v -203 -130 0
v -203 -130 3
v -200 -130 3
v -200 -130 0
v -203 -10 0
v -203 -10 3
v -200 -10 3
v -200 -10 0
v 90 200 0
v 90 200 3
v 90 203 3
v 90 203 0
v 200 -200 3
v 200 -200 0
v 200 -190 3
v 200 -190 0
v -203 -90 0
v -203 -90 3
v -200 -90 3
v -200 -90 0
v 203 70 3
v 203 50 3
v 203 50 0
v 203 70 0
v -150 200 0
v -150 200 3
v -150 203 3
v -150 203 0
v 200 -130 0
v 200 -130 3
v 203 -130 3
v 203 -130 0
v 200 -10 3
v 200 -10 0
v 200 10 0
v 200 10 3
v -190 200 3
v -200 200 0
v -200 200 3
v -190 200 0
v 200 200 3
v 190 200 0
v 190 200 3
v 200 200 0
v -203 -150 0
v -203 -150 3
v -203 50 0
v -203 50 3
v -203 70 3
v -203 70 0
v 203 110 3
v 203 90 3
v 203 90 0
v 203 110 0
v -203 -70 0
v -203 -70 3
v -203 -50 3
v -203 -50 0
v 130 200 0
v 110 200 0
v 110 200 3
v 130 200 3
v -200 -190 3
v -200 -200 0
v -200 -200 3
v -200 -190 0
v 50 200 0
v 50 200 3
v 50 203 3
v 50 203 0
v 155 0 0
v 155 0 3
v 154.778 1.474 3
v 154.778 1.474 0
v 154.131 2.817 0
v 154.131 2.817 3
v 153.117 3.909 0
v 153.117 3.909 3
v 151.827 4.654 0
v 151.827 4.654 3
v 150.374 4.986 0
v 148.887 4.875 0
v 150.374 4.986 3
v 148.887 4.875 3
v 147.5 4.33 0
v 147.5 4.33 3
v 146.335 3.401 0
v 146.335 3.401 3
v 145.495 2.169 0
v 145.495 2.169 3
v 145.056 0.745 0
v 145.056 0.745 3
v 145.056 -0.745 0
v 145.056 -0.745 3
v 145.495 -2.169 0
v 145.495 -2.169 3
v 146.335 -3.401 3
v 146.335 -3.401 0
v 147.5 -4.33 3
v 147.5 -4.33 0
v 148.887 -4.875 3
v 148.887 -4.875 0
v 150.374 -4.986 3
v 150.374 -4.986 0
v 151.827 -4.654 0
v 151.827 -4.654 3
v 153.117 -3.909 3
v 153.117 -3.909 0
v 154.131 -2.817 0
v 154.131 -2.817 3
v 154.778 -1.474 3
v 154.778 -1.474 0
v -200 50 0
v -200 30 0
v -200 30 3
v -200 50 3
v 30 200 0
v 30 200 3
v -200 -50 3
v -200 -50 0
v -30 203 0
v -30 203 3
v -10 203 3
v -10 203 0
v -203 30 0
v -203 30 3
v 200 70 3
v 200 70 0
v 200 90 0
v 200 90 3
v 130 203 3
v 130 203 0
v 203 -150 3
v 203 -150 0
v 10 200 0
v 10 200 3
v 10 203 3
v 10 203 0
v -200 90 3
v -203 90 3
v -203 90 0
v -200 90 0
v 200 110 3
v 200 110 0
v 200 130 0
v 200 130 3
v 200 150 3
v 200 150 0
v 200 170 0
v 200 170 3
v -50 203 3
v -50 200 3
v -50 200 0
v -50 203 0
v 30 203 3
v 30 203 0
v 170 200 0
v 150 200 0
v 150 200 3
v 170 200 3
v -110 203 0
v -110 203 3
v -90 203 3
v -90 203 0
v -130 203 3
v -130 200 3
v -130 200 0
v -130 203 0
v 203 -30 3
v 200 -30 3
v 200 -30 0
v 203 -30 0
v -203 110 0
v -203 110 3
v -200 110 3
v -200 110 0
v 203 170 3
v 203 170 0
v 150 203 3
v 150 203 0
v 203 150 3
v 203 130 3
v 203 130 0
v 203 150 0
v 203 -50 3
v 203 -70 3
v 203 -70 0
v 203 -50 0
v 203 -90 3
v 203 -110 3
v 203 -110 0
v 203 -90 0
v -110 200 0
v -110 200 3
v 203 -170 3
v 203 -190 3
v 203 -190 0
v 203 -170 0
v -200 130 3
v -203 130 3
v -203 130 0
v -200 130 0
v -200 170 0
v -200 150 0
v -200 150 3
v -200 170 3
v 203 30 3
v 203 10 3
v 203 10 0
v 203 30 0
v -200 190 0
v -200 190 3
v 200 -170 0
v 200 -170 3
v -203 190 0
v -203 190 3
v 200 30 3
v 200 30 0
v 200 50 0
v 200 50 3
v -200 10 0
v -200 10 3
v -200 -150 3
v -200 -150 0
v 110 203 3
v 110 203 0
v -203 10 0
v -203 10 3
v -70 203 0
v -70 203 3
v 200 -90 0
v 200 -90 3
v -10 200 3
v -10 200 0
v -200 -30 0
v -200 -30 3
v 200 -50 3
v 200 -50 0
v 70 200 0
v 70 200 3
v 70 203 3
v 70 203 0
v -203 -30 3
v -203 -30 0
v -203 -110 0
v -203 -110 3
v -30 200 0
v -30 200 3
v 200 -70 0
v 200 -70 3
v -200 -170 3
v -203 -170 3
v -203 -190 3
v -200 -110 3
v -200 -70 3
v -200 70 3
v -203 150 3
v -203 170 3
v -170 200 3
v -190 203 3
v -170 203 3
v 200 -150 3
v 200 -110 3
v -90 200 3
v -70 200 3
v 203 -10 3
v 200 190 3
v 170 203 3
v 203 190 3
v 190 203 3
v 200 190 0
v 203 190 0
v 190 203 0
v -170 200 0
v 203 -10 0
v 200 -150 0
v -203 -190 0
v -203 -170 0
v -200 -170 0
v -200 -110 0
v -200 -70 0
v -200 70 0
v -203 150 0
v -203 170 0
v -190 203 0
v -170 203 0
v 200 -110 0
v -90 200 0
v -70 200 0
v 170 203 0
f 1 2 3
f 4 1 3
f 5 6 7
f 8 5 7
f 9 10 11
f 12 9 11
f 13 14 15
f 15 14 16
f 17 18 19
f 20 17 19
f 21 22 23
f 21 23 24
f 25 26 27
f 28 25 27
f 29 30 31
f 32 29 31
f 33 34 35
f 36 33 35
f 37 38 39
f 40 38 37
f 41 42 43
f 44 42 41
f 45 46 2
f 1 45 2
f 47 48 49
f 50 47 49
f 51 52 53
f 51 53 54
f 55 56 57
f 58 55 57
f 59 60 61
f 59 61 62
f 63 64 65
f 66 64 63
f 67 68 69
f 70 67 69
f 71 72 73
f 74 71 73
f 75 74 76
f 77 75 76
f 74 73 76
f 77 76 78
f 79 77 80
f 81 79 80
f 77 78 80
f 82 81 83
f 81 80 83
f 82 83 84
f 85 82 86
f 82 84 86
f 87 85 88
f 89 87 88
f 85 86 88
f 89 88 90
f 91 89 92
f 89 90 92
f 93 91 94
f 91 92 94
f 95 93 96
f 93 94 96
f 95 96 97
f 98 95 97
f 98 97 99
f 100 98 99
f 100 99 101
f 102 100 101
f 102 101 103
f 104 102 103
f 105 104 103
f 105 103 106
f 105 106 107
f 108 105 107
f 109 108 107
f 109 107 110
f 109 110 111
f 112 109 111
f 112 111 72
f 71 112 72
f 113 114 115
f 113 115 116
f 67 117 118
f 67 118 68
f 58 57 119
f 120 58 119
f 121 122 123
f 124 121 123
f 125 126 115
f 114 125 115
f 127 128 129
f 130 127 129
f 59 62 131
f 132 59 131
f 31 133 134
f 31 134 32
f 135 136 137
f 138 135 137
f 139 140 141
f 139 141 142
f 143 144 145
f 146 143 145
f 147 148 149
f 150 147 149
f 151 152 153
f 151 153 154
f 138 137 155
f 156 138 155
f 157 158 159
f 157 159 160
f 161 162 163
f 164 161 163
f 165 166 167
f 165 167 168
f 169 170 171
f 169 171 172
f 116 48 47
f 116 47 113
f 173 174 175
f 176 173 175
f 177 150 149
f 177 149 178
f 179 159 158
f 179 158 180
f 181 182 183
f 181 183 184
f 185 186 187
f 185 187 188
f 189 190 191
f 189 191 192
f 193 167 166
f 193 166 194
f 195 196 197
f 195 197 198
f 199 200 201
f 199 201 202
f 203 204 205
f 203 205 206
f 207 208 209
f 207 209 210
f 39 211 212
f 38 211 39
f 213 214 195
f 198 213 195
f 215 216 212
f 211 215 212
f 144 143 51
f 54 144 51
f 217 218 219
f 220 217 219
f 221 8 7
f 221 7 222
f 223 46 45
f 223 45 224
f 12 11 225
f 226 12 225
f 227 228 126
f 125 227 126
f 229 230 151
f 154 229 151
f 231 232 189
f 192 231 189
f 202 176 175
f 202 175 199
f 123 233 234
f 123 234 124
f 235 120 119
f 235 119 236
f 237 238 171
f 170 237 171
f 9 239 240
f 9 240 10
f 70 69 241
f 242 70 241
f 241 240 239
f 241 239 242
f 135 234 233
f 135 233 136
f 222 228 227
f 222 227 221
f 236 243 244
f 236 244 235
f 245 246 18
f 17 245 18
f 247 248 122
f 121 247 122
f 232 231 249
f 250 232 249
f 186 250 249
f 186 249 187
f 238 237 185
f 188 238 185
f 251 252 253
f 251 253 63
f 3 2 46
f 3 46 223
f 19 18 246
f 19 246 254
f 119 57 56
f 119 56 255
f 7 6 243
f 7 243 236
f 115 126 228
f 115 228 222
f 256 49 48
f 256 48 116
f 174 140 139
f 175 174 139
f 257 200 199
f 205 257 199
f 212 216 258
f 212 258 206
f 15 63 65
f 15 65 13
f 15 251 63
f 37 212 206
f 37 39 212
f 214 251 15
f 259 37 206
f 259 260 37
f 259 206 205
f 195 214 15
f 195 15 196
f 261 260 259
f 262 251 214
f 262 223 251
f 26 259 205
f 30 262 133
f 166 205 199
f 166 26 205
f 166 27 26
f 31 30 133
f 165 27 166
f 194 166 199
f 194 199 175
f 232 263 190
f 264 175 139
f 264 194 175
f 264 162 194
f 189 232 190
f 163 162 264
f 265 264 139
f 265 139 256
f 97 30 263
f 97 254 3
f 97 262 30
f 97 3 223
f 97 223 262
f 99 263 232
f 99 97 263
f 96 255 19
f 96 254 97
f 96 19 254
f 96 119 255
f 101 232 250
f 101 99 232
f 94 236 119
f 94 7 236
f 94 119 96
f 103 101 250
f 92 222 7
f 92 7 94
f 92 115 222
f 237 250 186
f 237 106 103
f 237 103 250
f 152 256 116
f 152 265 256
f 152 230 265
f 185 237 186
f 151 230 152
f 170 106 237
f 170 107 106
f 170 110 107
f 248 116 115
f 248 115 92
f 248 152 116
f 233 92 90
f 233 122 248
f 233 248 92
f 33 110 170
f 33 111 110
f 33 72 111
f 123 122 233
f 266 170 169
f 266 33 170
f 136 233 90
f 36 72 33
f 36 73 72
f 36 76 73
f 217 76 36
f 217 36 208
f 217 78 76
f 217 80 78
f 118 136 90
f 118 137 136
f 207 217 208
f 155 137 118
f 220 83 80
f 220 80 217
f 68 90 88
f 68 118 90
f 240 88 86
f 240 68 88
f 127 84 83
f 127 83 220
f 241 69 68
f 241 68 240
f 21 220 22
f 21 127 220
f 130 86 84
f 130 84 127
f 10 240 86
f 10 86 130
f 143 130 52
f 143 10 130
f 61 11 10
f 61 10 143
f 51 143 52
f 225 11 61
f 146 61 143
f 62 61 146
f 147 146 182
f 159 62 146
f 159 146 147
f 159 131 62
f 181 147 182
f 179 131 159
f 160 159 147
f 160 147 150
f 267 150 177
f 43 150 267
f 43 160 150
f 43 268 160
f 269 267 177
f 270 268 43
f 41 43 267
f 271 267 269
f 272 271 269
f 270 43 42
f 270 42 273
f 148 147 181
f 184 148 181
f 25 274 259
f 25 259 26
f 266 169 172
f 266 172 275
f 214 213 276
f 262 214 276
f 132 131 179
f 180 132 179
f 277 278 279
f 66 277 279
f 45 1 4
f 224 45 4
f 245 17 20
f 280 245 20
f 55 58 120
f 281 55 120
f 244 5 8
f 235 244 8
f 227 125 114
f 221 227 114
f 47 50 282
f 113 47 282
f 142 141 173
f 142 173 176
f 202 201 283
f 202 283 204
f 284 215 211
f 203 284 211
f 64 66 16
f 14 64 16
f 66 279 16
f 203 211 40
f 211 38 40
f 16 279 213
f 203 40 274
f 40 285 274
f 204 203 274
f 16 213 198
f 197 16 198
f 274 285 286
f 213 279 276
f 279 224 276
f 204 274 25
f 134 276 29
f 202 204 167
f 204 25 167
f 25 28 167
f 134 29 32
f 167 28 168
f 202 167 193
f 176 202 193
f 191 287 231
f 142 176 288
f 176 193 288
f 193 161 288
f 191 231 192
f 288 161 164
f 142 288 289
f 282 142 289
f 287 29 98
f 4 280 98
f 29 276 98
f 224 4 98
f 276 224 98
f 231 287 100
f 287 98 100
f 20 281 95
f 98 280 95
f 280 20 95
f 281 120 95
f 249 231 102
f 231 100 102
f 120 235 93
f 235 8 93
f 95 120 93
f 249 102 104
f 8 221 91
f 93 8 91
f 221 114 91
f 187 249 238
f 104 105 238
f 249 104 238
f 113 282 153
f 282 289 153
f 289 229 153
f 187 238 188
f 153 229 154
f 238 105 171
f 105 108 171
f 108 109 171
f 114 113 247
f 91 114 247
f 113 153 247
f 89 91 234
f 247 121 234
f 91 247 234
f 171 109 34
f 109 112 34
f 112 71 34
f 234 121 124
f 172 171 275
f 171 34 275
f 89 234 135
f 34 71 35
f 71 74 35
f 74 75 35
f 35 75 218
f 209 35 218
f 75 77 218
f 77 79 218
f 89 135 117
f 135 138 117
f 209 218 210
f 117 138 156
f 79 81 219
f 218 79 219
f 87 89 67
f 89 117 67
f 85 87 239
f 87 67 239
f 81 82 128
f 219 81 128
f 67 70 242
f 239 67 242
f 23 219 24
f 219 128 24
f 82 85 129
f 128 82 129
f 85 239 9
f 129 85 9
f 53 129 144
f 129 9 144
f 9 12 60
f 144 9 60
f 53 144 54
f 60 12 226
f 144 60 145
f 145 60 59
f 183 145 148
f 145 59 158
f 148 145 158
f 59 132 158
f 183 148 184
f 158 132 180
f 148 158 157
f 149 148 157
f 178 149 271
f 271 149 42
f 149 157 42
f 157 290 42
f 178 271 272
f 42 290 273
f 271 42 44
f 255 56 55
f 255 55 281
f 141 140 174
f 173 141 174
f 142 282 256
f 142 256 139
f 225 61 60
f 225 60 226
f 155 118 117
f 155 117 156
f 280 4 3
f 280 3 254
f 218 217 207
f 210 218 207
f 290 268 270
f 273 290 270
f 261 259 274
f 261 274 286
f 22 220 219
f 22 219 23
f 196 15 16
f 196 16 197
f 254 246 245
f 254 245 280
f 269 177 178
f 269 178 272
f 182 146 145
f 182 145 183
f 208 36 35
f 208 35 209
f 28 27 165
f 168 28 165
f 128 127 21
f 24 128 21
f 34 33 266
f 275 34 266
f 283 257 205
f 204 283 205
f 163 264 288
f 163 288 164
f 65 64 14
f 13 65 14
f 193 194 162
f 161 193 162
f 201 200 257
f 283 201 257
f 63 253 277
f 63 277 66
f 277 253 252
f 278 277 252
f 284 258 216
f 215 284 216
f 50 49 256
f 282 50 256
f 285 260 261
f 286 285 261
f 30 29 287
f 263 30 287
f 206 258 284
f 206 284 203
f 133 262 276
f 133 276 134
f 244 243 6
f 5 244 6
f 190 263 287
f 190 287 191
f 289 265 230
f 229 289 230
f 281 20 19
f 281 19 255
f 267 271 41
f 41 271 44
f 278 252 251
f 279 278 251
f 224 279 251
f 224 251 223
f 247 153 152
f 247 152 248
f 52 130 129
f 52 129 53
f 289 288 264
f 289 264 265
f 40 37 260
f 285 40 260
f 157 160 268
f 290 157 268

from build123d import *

# Parameters (mm, degrees)
F0_W     = 400
F0_H     = 400
F1_DEPTH = 3
F2_W     = 20
F2_H     = 3
F2_W_2   = 3
F2_H_2   = 20
F3_DEPTH = 3
F4_R     = 5
F5_DEPTH = 25
F6_W     = 380
F6_H     = 3
F7_DEPTH = 25


with BuildPart() as f1:
    # F0 (on Top) → F1 (new body)
    with BuildSketch(Plane.XY):
        Rectangle(F0_W, F0_H)
    extrude(amount=F1_DEPTH)

    # F2 (on face) → F3 (join, through all)
    with BuildSketch(Plane.XY.offset(3)):
        with Locations((-180, -201.5)):
            Rectangle(F2_W, F2_H)
        with Locations((-140, -201.5)):
            Rectangle(F2_W, F2_H)
        with Locations((-100, -201.5)):
            Rectangle(F2_W, F2_H)
        with Locations((-60, -201.5)):
            Rectangle(F2_W, F2_H)
        with Locations((-20, -201.5)):
            Rectangle(F2_W, F2_H)
        with Locations((20, -201.5)):
            Rectangle(F2_W, F2_H)
        with Locations((60, -201.5)):
            Rectangle(F2_W, F2_H)
        with Locations((100, -201.5)):
            Rectangle(F2_W, F2_H)
        with Locations((140, -201.5)):
            Rectangle(F2_W, F2_H)
        with Locations((180, -201.5)):
            Rectangle(F2_W, F2_H)
        with Locations((201.5, 100)):
            Rectangle(F2_W_2, F2_H_2)
        with Locations((201.5, 180)):
            Rectangle(F2_W_2, F2_H_2)
        with Locations((201.5, 20)):
            Rectangle(F2_W_2, F2_H_2)
        with Locations((201.5, 140)):
            Rectangle(F2_W_2, F2_H_2)
        with Locations((201.5, -20)):
            Rectangle(F2_W_2, F2_H_2)
        with Locations((201.5, 60)):
            Rectangle(F2_W_2, F2_H_2)
        with Locations((201.5, -60)):
            Rectangle(F2_W_2, F2_H_2)
        with Locations((201.5, -180)):
            Rectangle(F2_W_2, F2_H_2)
        with Locations((201.5, -140)):
            Rectangle(F2_W_2, F2_H_2)
        with Locations((201.5, -100)):
            Rectangle(F2_W_2, F2_H_2)
        with Locations((-100, 201.5)):
            Rectangle(F2_W, F2_H)
        with Locations((-180, 201.5)):
            Rectangle(F2_W, F2_H)
        with Locations((-20, 201.5)):
            Rectangle(F2_W, F2_H)
        with Locations((-140, 201.5)):
            Rectangle(F2_W, F2_H)
        with Locations((20, 201.5)):
            Rectangle(F2_W, F2_H)
        with Locations((-60, 201.5)):
            Rectangle(F2_W, F2_H)
        with Locations((60, 201.5)):
            Rectangle(F2_W, F2_H)
        with Locations((180, 201.5)):
            Rectangle(F2_W, F2_H)
        with Locations((140, 201.5)):
            Rectangle(F2_W, F2_H)
        with Locations((100, 201.5)):
            Rectangle(F2_W, F2_H)
        with Locations((-201.5, -100)):
            Rectangle(F2_W_2, F2_H_2)
        with Locations((-201.5, -180)):
            Rectangle(F2_W_2, F2_H_2)
        with Locations((-201.5, -20)):
            Rectangle(F2_W_2, F2_H_2)
        with Locations((-201.5, -140)):
            Rectangle(F2_W_2, F2_H_2)
        with Locations((-201.5, 20)):
            Rectangle(F2_W_2, F2_H_2)
        with Locations((-201.5, -60)):
            Rectangle(F2_W_2, F2_H_2)
        with Locations((-201.5, 60)):
            Rectangle(F2_W_2, F2_H_2)
        with Locations((-201.5, 180)):
            Rectangle(F2_W_2, F2_H_2)
        with Locations((-201.5, 140)):
            Rectangle(F2_W_2, F2_H_2)
        with Locations((-201.5, 100)):
            Rectangle(F2_W_2, F2_H_2)
    extrude(amount=-F3_DEPTH)

    # F4 (on face) → F5 (cut)
    with BuildSketch(Plane.XY.offset(3)):
        with Locations((150, 0)):
            Circle(F4_R)
    extrude(amount=-F5_DEPTH, mode=Mode.SUBTRACT)

    # F6 (on face) → F7 (cut)
    with BuildSketch(Plane.XY.offset(3)):
        with Locations((0, -201.5)):
            Rectangle(F6_W, F6_H)
    extrude(amount=-F7_DEPTH, mode=Mode.SUBTRACT)


solid = f1.part
